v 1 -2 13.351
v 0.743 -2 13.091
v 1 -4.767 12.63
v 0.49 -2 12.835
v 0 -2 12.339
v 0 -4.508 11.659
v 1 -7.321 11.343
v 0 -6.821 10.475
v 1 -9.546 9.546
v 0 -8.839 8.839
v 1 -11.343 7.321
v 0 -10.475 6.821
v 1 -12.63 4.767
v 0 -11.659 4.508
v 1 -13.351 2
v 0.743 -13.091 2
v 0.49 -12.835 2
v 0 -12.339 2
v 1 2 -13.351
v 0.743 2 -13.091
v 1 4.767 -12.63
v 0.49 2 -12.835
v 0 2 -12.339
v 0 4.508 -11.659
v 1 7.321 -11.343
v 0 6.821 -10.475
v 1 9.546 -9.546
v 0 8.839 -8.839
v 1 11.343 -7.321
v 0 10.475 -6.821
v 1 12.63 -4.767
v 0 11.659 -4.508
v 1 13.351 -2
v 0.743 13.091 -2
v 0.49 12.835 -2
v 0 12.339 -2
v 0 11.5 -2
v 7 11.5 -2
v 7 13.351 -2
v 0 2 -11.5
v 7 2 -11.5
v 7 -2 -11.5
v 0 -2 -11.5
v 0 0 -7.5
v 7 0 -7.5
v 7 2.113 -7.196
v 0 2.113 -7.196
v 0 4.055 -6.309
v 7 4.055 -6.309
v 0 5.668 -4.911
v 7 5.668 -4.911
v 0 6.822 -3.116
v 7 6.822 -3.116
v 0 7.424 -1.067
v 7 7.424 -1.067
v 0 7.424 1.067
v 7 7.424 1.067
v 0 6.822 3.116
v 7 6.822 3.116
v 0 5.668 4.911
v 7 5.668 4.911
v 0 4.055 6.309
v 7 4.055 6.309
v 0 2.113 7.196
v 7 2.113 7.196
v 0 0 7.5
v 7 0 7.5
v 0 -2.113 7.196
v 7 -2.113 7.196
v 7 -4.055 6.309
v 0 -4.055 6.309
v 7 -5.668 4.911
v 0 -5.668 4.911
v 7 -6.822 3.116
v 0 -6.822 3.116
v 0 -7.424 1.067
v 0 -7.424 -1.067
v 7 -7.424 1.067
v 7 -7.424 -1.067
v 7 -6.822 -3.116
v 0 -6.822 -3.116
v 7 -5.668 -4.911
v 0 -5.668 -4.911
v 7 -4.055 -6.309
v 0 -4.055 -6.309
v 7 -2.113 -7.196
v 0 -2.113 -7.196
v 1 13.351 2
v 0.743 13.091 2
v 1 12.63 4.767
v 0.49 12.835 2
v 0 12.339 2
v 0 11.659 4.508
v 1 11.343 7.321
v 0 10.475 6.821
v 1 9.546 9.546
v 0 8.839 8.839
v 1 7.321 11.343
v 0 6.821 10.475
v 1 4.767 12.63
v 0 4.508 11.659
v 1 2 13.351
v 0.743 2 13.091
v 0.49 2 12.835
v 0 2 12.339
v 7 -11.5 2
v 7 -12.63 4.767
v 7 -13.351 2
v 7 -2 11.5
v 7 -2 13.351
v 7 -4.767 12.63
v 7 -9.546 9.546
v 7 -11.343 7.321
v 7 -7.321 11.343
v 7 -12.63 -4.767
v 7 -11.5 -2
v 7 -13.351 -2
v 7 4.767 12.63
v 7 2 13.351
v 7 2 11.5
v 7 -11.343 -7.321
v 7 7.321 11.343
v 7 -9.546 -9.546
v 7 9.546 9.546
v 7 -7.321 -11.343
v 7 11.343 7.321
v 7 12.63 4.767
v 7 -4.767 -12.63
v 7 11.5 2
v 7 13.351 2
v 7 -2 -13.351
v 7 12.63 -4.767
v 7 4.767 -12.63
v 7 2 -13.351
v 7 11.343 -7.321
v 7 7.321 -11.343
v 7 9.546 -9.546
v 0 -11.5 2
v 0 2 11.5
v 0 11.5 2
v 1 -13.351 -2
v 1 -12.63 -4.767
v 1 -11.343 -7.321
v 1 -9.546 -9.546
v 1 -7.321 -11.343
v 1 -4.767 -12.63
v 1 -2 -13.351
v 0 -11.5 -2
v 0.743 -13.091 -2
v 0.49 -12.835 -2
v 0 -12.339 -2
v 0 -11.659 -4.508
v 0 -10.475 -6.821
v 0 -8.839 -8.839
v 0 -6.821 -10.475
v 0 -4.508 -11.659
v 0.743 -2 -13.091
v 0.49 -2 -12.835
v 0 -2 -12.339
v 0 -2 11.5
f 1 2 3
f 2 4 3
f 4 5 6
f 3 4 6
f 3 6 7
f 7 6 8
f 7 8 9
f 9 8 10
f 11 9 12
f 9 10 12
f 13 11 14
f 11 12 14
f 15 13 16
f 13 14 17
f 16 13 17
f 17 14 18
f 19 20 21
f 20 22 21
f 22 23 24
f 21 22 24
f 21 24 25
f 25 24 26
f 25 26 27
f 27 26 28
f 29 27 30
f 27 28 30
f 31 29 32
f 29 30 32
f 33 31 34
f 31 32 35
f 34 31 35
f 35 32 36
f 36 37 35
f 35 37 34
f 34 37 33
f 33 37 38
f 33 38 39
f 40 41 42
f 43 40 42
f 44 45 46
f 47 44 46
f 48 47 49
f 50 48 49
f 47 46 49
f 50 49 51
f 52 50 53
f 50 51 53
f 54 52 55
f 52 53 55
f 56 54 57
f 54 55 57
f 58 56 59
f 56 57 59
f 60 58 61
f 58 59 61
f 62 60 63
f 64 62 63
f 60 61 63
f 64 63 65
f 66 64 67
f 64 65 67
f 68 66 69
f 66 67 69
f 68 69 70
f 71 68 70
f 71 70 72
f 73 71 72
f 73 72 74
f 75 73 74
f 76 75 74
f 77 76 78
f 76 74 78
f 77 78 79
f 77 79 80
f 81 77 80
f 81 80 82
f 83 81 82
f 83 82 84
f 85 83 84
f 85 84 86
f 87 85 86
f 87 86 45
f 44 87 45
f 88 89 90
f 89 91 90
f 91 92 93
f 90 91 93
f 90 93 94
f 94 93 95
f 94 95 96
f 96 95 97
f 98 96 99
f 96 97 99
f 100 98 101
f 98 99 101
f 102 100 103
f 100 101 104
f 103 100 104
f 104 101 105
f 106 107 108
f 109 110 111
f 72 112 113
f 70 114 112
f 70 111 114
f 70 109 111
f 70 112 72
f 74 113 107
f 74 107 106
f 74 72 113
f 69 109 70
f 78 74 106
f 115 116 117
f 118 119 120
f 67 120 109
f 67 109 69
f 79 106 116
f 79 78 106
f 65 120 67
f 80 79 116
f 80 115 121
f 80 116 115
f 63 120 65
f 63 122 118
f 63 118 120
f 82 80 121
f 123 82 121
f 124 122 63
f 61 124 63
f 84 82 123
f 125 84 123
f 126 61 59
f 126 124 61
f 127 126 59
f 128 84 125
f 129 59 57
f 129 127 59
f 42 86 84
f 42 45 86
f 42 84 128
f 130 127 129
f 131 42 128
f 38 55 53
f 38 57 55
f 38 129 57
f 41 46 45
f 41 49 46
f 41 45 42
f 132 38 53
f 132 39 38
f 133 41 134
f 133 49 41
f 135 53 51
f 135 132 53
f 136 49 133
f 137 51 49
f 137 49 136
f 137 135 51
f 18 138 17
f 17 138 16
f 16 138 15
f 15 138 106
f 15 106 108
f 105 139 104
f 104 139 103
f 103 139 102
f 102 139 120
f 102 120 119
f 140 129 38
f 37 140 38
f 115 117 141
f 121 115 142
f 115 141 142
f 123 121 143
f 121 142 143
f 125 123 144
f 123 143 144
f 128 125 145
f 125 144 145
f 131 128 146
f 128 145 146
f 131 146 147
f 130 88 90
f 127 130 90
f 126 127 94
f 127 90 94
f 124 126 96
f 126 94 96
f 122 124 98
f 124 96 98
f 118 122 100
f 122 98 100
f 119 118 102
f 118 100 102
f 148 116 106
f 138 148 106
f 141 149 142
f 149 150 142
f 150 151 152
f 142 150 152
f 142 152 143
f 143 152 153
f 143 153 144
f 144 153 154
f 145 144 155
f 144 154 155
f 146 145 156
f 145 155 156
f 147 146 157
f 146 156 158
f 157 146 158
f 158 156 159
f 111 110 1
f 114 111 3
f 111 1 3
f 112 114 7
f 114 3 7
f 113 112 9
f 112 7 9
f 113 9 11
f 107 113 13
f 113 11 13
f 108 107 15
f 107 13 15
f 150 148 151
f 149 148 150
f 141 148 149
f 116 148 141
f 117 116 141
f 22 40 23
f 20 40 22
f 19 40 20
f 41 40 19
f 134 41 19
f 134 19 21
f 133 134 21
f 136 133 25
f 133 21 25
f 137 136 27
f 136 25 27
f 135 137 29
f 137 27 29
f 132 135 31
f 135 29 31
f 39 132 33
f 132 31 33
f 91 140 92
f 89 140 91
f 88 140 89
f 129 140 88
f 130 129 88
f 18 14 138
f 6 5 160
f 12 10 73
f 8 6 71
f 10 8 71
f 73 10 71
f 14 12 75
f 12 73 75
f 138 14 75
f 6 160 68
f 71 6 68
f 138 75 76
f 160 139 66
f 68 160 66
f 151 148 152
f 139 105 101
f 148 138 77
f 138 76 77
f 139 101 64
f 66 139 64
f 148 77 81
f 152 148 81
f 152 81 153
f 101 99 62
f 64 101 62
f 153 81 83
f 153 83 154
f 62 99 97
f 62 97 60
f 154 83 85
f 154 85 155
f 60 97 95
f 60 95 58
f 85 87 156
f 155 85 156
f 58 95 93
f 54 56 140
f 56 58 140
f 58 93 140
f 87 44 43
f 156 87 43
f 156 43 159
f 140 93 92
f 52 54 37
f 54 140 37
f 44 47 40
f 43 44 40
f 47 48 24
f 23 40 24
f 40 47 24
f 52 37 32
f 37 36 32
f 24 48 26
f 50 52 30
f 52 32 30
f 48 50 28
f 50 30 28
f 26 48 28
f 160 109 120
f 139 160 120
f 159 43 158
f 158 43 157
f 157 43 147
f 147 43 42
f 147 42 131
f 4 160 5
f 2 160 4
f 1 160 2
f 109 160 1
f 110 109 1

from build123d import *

# Parameters (mm, degrees)
SKETCH1_R           = 13.5
BOSS_EXTRUDE1_DEPTH = 7
SKETCH2_R           = 7.5
CUT_EXTRUDE1_DEPTH  = 8
CHAMFER1_SIZE       = 1
SKETCH3_W           = 4
SKETCH3_H           = 4
CUT_EXTRUDE2_DEPTH  = 8
CIRPATTERN1_COUNT   = 4


with BuildPart() as part:
    # Sketch1 → Boss-Extrude1 (new body)
    with BuildSketch(Plane(origin=(0, 0, 0), x_dir=(0, 0, -1), z_dir=(1, 0, 0))):
        Circle(SKETCH1_R)
    extrude(amount=BOSS_EXTRUDE1_DEPTH)

    # Sketch2 → Cut-Extrude1 (cut, through all)
    with BuildSketch(Plane(origin=(7, 0, 0), x_dir=(0, 0, -1), z_dir=(1, 0, 0))):
        Circle(SKETCH2_R)
    extrude(amount=-CUT_EXTRUDE1_DEPTH, mode=Mode.SUBTRACT)

    # Chamfer1
    chamfer1_edges = [part.edges().sort_by_distance(p)[0] for p in [
        (0, 0, 13.5),
    ]]
    chamfer(chamfer1_edges, length=CHAMFER1_SIZE)

    # Sketch3 → Cut-Extrude2 (cut, through all)
    with BuildSketch(Plane(origin=(7, 0, 0), x_dir=(0, 0, -1), z_dir=(1, 0, 0))):
        with Locations((0, 13.5)):
            Rectangle(SKETCH3_W, SKETCH3_H)
    cut_extrude2 = extrude(amount=-CUT_EXTRUDE2_DEPTH, mode=Mode.SUBTRACT)

    # CirPattern1: Cut-Extrude2 ×4 about axis
    cirpattern1_axis = Axis((0, 0, 0), (1, 0, 0))
    for i in range(1, CIRPATTERN1_COUNT):
        add(cut_extrude2.rotate(cirpattern1_axis, i * 360 / CIRPATTERN1_COUNT), mode=Mode.SUBTRACT)


solid = part.part
